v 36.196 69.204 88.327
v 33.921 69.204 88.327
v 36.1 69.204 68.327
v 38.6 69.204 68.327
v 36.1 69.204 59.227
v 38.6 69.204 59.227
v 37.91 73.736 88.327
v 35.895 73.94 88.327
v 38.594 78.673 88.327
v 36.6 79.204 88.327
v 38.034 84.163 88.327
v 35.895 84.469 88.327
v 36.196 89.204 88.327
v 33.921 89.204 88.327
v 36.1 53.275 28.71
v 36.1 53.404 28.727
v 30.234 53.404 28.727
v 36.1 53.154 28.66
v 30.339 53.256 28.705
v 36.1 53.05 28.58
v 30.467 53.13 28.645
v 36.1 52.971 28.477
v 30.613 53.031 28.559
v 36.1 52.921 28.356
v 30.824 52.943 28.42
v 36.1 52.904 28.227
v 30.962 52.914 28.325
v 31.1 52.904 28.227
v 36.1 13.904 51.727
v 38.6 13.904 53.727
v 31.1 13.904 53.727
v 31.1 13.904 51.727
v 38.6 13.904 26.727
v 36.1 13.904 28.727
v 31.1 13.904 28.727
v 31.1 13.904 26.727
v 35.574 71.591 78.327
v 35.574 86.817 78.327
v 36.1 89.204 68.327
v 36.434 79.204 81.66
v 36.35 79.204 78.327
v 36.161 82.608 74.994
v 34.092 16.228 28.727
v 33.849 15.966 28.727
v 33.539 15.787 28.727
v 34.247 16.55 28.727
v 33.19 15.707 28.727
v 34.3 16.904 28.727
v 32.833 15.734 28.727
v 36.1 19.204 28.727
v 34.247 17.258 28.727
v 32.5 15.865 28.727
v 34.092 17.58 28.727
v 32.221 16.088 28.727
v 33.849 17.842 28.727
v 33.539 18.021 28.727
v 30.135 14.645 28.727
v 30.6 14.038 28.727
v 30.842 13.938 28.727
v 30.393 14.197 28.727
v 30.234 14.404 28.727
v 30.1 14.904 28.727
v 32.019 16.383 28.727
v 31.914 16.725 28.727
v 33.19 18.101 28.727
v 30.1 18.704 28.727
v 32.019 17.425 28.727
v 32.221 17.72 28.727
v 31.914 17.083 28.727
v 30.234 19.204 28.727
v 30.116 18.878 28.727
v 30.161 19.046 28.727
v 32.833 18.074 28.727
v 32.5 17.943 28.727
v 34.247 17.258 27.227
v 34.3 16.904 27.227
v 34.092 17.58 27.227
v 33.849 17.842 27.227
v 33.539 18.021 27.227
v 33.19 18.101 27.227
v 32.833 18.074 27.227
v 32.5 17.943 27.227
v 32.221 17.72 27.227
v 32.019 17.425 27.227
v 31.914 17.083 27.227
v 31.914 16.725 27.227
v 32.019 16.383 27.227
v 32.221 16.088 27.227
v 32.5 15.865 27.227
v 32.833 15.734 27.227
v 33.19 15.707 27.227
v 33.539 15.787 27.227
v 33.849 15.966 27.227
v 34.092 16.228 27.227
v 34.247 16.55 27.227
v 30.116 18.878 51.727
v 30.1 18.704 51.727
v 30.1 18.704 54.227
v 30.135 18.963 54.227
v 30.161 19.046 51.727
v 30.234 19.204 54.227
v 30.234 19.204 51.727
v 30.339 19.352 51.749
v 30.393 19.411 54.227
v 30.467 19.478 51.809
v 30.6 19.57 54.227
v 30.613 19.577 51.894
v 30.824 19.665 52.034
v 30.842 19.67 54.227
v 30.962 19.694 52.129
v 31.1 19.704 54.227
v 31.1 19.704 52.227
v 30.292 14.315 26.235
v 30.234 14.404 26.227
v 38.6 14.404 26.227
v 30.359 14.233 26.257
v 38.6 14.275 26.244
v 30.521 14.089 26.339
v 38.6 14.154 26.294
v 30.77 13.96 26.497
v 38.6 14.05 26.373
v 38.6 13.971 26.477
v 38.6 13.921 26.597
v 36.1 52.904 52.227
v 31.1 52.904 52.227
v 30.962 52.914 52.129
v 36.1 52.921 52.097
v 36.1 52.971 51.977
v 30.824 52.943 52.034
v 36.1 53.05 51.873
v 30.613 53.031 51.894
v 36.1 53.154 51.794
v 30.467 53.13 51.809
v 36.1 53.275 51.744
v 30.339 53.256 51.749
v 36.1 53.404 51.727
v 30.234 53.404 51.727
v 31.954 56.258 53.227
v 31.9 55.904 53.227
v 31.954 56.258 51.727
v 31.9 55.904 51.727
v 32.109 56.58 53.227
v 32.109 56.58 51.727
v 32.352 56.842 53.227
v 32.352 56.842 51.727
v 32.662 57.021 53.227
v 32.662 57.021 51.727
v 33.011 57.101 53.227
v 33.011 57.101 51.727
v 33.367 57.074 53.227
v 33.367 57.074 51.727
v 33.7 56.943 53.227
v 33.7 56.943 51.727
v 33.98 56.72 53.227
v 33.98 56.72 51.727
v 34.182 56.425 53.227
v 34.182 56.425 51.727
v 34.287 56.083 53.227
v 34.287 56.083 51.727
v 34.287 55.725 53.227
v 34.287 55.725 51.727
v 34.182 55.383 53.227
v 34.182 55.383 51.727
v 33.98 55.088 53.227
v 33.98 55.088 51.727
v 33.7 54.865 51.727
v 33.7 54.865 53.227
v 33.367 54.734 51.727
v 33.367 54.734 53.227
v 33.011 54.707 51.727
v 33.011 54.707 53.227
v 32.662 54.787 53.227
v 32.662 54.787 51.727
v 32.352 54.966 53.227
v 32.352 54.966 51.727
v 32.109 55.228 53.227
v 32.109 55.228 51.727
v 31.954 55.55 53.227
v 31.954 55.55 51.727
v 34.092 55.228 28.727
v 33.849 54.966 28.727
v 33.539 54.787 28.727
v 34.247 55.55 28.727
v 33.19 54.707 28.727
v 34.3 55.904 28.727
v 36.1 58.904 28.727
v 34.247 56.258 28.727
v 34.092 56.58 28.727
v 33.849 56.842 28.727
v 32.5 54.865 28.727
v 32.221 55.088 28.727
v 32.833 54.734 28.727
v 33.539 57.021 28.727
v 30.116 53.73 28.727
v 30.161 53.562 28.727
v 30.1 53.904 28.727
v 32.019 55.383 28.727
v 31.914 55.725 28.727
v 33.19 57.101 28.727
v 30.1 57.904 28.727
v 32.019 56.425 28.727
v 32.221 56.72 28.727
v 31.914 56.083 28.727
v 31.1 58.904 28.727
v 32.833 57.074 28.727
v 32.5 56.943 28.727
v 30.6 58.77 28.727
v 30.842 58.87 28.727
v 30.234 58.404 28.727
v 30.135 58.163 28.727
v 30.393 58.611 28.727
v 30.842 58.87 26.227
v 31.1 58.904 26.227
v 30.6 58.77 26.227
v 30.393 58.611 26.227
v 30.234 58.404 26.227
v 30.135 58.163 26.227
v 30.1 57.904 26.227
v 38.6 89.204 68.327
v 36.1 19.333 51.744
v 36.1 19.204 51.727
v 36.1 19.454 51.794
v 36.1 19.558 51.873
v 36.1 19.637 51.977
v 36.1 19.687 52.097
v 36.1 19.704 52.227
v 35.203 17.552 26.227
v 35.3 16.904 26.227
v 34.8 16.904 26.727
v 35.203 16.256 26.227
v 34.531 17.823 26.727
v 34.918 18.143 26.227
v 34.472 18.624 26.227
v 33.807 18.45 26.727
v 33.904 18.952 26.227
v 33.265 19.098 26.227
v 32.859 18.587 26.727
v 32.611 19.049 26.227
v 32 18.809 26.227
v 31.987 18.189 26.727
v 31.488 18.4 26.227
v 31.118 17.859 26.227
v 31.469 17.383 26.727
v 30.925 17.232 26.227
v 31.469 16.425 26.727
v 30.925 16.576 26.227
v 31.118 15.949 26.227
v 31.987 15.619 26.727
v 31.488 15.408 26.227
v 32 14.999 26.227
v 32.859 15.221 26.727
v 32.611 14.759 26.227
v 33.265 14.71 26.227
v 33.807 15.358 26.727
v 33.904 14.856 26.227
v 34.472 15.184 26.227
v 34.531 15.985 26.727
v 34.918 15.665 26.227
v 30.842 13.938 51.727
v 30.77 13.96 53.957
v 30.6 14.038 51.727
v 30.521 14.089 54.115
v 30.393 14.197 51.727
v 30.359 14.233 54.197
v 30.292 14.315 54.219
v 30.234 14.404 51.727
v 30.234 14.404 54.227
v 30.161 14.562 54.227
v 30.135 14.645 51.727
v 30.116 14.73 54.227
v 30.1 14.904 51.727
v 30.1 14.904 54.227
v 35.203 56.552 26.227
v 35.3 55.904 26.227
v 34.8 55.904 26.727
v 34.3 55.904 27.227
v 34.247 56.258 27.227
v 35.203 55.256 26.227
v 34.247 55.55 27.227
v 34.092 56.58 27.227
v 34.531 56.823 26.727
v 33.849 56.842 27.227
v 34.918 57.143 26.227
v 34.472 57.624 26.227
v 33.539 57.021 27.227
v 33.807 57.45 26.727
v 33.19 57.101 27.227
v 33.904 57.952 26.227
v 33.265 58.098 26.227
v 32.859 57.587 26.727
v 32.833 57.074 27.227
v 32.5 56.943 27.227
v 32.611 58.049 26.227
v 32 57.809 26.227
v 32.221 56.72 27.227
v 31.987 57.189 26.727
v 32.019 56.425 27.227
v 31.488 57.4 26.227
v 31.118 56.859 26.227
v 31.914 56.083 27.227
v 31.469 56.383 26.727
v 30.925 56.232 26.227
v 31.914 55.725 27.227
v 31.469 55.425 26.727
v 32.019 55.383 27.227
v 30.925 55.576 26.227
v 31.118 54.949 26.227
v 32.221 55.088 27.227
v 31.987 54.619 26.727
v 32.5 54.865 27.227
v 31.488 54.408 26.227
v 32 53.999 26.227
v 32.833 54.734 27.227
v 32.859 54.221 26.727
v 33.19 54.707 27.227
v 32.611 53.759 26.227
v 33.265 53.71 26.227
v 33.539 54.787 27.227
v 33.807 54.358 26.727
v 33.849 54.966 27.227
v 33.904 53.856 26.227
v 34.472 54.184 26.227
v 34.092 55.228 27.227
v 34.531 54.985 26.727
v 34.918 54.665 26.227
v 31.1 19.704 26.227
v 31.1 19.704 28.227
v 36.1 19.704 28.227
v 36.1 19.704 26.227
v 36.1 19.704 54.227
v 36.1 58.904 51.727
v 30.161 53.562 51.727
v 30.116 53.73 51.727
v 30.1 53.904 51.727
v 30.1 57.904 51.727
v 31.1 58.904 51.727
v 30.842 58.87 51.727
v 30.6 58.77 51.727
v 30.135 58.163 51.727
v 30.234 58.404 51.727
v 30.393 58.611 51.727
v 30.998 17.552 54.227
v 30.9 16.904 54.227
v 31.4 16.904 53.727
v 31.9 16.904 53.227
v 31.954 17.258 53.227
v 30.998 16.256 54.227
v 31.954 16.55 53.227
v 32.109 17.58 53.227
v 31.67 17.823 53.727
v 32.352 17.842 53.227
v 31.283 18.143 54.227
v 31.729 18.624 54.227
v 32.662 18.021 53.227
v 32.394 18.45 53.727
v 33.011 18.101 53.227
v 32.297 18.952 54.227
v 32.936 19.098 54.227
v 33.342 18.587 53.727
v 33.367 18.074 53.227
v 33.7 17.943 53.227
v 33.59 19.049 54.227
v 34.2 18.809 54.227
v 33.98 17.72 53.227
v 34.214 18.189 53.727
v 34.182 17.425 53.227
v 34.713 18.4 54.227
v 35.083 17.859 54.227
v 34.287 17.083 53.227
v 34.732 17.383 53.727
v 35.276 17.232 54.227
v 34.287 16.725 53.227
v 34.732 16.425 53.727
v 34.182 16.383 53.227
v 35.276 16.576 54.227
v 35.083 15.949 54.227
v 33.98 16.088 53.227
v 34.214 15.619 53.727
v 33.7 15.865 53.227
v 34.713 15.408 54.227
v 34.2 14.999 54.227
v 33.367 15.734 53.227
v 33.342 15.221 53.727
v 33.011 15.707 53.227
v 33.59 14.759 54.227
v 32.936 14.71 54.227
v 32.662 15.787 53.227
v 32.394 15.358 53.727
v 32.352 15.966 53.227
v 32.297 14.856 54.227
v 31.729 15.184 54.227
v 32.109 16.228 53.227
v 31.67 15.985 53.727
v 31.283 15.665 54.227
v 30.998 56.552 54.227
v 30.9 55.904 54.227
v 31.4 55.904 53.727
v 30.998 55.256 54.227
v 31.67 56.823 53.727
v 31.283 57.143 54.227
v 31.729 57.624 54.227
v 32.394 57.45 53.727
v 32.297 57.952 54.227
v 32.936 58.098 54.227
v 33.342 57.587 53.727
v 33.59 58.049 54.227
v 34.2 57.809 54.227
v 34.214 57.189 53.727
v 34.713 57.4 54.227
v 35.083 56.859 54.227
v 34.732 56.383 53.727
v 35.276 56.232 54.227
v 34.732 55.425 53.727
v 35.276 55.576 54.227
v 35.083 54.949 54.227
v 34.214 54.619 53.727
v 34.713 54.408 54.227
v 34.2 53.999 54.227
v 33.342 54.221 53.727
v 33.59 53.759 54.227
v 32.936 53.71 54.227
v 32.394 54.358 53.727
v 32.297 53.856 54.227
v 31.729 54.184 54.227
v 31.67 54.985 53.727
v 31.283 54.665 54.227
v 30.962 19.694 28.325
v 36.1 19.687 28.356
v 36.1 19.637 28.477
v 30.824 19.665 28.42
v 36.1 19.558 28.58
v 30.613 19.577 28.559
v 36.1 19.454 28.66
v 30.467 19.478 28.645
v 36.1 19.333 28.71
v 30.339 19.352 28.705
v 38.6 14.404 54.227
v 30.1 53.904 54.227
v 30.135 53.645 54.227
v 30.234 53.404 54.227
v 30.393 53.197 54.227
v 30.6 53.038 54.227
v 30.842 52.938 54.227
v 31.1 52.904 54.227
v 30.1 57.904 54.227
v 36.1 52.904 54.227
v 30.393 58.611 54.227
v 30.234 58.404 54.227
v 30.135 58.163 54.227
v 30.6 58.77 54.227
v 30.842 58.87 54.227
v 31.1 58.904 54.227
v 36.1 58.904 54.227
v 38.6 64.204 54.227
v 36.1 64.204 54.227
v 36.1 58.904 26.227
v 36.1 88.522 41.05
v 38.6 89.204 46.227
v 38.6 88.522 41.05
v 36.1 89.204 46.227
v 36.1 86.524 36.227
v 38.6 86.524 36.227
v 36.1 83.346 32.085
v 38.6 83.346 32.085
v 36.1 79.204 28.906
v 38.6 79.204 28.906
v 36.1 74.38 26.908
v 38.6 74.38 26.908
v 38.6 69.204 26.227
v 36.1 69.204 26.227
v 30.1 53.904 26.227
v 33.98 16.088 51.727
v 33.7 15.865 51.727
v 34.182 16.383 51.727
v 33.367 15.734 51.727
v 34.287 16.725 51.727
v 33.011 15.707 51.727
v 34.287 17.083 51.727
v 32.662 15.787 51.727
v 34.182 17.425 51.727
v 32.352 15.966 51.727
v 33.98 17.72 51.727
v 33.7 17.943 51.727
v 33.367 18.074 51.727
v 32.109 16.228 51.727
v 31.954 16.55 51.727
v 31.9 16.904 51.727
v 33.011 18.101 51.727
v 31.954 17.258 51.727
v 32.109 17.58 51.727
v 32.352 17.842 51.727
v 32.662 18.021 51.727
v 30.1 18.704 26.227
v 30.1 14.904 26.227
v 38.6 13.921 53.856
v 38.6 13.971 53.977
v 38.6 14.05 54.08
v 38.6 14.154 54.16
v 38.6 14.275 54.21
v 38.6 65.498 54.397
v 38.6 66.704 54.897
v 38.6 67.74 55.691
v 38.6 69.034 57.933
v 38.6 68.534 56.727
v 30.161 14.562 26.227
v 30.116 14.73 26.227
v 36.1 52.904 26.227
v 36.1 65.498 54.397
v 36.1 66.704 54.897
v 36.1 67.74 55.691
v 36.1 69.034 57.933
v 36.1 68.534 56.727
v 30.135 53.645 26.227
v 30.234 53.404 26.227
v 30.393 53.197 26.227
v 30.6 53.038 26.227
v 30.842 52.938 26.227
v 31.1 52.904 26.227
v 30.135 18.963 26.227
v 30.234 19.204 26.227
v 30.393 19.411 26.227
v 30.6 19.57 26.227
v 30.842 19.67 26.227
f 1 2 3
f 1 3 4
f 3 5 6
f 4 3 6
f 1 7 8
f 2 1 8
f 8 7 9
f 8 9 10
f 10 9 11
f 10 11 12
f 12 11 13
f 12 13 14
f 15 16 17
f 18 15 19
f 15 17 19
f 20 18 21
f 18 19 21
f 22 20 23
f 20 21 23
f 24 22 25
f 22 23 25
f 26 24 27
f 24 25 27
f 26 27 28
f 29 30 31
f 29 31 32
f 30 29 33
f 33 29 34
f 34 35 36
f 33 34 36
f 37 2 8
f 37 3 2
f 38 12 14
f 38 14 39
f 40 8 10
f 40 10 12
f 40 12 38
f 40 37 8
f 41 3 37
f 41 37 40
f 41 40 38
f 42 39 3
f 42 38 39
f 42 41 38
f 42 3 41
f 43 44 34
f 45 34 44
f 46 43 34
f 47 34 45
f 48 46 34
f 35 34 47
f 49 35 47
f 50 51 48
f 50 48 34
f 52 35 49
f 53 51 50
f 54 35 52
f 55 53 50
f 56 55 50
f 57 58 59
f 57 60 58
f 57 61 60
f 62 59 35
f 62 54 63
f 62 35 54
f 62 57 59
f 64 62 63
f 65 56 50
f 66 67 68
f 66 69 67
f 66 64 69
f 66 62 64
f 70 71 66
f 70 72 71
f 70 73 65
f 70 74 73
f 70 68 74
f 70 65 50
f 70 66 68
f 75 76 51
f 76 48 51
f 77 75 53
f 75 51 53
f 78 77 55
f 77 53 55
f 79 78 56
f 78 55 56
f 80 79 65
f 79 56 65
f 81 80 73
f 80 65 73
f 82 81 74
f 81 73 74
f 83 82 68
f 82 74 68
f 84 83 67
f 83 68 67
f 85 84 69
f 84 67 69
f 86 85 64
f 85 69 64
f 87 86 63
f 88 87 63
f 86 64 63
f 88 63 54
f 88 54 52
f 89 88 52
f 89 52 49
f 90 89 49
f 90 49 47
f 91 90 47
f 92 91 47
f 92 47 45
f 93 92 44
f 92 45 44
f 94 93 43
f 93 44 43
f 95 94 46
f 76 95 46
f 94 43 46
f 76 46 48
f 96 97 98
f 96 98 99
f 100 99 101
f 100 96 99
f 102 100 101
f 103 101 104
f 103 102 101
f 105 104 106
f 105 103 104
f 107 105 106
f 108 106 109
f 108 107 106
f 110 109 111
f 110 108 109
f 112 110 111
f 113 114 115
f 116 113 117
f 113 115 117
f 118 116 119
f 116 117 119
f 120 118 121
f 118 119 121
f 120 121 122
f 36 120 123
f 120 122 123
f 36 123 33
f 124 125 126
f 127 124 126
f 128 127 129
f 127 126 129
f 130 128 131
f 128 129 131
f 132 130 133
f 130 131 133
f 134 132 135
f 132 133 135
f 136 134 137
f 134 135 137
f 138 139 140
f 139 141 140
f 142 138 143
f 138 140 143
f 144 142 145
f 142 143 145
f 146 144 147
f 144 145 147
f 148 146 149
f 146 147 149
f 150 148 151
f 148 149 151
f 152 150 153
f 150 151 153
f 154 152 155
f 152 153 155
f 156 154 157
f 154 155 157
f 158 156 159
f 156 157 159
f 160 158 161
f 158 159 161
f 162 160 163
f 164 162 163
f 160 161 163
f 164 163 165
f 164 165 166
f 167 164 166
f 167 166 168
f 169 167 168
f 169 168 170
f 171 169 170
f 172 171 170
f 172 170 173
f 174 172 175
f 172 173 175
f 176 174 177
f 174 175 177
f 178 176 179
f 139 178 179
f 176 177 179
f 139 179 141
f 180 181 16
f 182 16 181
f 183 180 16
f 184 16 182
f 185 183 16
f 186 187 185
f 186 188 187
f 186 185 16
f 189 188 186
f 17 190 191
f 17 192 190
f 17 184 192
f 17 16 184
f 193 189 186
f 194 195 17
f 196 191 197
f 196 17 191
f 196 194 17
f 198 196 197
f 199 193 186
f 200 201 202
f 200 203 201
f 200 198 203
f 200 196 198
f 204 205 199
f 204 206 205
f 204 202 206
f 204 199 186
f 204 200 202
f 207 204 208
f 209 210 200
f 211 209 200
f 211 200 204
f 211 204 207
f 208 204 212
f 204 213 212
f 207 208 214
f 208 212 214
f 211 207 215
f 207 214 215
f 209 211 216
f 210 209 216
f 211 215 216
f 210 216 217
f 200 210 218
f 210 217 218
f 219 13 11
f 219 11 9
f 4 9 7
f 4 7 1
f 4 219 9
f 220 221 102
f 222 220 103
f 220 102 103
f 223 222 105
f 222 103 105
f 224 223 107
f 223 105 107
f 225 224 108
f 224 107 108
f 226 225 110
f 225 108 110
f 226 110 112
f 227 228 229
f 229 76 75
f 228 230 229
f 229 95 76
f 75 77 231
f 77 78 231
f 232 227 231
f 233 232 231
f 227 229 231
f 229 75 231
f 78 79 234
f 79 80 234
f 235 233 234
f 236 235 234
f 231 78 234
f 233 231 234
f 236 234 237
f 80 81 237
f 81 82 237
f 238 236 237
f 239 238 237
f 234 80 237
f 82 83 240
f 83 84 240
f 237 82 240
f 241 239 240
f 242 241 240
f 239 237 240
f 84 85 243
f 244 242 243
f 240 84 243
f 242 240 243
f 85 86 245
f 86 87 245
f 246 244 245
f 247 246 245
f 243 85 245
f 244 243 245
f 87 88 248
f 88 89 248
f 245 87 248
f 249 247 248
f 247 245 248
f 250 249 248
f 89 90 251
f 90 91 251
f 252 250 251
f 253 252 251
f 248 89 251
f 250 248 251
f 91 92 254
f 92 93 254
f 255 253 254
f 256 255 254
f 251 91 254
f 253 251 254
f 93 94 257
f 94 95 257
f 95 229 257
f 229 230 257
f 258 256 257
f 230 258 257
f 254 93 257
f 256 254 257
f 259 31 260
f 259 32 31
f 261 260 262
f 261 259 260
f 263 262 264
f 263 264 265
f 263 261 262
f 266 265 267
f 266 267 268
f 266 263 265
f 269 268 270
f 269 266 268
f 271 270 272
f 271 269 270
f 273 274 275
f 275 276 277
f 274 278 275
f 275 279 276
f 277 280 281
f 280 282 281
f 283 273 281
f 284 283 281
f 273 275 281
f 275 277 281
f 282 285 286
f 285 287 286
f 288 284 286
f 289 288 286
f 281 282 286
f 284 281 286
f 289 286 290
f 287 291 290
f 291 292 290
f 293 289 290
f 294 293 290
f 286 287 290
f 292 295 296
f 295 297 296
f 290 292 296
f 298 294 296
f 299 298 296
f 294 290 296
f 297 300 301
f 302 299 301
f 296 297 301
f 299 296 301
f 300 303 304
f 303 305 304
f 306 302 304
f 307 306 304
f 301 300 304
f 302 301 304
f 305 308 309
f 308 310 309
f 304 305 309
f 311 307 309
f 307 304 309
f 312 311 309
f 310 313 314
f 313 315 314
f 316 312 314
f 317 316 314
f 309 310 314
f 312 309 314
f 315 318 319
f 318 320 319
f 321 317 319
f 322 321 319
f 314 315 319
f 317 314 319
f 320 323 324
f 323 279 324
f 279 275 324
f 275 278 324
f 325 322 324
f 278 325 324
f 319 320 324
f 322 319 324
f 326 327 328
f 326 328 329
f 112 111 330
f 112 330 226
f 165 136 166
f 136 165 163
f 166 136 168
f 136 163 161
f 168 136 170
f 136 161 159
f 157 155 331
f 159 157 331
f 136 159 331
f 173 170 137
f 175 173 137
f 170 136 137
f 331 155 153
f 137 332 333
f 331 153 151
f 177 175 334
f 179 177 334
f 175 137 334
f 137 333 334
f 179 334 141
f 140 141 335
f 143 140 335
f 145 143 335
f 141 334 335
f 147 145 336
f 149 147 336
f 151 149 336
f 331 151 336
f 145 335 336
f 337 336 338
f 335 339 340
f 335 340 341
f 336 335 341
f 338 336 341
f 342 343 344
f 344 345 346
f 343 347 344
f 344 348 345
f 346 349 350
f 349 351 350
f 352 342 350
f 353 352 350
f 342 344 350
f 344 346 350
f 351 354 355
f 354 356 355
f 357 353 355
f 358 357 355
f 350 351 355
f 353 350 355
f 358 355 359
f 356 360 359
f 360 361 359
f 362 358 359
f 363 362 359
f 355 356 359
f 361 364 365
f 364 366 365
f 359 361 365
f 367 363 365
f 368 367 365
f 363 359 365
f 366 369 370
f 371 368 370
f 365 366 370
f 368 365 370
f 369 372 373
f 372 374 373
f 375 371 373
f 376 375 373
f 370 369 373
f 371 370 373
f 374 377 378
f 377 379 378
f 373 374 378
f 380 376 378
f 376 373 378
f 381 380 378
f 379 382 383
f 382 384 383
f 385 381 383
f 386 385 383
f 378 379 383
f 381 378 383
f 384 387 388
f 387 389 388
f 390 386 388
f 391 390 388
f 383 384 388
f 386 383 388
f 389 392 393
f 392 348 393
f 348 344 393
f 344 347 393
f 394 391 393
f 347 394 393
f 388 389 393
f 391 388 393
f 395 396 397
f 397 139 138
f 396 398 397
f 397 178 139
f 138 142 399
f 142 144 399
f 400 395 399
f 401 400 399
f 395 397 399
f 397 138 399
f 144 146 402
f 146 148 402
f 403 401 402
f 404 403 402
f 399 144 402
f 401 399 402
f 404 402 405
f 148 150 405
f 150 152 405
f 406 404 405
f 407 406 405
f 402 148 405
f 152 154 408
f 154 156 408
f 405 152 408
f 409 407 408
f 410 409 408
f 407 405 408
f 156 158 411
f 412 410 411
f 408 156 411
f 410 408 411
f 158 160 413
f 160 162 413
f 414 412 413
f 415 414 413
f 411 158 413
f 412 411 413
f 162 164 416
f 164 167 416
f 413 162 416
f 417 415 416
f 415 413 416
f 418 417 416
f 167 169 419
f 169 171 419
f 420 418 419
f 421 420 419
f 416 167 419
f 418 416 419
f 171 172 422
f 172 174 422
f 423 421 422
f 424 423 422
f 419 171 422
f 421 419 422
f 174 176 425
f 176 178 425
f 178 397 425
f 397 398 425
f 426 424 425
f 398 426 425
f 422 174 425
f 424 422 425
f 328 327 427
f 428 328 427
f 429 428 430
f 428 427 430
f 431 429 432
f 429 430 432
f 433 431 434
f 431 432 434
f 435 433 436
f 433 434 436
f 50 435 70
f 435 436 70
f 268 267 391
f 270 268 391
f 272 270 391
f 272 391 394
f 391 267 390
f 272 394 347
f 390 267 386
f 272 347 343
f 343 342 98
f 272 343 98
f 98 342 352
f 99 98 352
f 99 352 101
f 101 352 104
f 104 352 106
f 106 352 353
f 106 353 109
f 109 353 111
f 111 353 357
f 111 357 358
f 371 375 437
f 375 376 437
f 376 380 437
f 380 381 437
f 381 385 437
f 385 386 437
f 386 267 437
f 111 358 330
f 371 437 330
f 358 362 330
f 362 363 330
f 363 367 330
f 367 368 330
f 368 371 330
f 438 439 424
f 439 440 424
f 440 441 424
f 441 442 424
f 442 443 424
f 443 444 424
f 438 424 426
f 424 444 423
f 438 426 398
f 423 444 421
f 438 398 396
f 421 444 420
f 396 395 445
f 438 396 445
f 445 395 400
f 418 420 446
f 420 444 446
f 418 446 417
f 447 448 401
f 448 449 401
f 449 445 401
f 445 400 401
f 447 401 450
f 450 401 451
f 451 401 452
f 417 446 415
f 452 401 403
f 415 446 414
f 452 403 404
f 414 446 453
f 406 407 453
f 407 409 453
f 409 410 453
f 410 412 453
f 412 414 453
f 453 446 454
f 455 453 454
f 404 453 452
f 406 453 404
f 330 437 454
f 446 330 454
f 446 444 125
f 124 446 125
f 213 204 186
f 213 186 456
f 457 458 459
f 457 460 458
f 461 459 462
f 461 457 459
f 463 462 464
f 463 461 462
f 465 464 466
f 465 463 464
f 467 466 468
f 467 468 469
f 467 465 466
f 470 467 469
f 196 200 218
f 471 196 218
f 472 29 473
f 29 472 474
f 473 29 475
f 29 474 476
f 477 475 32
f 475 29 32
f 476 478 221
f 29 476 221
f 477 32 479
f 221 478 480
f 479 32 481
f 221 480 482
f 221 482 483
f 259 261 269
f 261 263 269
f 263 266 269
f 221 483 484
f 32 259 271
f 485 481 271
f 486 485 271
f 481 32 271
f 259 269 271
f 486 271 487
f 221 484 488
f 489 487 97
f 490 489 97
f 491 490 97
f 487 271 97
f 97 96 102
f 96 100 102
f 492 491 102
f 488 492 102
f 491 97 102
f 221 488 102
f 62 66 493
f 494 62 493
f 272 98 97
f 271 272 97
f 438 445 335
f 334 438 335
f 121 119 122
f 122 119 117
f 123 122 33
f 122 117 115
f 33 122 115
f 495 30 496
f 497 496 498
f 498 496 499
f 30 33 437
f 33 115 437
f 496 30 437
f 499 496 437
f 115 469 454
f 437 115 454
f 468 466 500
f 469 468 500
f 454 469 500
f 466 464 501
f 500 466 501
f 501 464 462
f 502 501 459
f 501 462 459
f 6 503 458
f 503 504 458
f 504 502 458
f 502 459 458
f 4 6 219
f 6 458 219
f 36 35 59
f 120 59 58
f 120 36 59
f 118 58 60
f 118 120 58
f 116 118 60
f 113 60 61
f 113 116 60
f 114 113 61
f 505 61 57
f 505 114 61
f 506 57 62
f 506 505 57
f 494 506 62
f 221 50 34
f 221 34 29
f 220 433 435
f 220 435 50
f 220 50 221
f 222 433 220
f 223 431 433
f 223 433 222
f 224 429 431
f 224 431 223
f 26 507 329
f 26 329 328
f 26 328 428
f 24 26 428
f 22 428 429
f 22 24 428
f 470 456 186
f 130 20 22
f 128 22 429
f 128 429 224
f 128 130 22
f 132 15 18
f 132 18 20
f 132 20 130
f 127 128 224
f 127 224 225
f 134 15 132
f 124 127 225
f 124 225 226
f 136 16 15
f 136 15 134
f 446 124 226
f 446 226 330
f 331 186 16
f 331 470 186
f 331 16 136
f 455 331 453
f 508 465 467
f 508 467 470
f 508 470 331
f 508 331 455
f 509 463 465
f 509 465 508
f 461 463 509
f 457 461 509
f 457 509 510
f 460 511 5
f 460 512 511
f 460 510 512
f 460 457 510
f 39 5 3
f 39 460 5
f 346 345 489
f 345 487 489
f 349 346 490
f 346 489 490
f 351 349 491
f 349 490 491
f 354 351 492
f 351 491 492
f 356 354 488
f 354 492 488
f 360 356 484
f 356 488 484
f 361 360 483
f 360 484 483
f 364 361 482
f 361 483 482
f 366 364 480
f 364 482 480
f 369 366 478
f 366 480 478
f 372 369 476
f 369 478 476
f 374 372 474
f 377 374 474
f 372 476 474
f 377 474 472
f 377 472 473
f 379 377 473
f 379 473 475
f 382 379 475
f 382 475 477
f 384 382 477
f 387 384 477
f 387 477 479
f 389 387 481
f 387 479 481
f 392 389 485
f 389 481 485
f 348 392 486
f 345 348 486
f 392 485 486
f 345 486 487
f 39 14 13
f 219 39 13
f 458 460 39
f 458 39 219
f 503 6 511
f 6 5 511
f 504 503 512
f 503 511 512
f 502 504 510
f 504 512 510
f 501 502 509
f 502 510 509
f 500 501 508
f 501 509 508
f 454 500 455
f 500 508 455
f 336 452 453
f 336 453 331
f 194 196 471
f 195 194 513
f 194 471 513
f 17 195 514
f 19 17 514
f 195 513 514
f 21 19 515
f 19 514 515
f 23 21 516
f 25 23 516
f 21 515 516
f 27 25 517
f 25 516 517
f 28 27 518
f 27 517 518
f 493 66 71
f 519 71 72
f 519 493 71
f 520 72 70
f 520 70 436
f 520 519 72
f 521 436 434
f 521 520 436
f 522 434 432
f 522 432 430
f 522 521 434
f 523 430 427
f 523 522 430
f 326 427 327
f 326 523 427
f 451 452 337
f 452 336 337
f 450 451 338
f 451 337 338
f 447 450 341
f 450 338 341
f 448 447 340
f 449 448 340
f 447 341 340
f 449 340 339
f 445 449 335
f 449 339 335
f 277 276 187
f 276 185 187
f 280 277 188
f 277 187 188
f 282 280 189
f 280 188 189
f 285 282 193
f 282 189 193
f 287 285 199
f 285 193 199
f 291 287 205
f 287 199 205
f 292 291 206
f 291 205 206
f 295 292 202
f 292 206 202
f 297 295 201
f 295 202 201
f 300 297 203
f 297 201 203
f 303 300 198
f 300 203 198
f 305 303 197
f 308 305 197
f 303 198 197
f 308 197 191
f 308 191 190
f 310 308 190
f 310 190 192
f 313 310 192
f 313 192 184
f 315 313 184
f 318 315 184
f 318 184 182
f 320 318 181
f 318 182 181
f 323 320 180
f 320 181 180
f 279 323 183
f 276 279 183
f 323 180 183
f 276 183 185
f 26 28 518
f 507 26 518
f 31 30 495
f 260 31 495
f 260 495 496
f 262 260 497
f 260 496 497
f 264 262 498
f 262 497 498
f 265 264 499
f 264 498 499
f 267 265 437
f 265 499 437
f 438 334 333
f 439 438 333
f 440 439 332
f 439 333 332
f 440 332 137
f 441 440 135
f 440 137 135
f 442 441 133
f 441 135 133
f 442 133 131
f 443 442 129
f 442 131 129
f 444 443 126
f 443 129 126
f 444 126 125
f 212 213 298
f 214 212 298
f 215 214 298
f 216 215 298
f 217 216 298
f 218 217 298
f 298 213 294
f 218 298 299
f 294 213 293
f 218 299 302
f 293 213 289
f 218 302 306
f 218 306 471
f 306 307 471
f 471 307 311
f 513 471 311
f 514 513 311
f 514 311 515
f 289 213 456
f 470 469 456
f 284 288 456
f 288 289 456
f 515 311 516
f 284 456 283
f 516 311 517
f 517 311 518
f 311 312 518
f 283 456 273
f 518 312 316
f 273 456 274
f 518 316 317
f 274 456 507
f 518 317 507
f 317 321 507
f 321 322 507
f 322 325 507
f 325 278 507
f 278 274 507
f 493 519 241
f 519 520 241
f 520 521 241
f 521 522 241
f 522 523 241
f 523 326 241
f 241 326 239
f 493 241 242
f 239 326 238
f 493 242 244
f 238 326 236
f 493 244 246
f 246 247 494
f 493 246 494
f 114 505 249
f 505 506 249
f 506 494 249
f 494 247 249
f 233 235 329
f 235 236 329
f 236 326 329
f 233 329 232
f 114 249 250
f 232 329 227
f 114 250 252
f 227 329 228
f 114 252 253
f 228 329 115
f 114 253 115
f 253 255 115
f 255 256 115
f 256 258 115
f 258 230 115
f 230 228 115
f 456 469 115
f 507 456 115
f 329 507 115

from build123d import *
from OCP.BRepFilletAPI import BRepFilletAPI_MakeFillet

# Parameters (mm, degrees)
SKETCH1_W                                           = 2.5
SKETCH1_H                                           = 6
BOSS_EXTRUDE1_DEPTH                                 = 6
SKETCH1_H_2                                         = 5.8
BOSS_EXTRUDE1_2_DEPTH                               = 6
BOSS_EXTRUDE1_3_DEPTH                               = 6
BOSS_EXTRUDE1_4_DEPTH                               = 6
SKETCH2_W                                           = 28
SKETCH2_H                                           = 45
BOSS_EXTRUDE2_DEPTH                                 = 2.5
BOSS_EXTRUDE3_DEPTH                                 = 2.5
CSK_FOR_M2_COUNTERSUNK_FLAT_HEAD_SCREW1_D           = 2.4
CSK_FOR_M2_COUNTERSUNK_FLAT_HEAD_SCREW1_DEPTH       = 4
CSK_FOR_M2_COUNTERSUNK_FLAT_HEAD_SCREW1_CSINK_D     = 4.4
CSK_FOR_M2_COUNTERSUNK_FLAT_HEAD_SCREW1_CSINK_ANGLE = 90
CSK_FOR_M2_COUNTERSUNK_FLAT_HEAD_SCREW1_TIP         = 0.721032743
CSK_FOR_M2_COUNTERSUNK_FLAT_HEAD_SCREW2_D           = 2.4
CSK_FOR_M2_COUNTERSUNK_FLAT_HEAD_SCREW2_DEPTH       = 4
CSK_FOR_M2_COUNTERSUNK_FLAT_HEAD_SCREW2_CSINK_D     = 4.4
CSK_FOR_M2_COUNTERSUNK_FLAT_HEAD_SCREW2_CSINK_ANGLE = 90
CSK_FOR_M2_COUNTERSUNK_FLAT_HEAD_SCREW2_TIP         = 0.721032743
FILLET1_R1                                          = 20
FILLET1_R2                                          = 5
FILLET2_R                                           = 1
FILLET3_R                                           = 0.5


with BuildPart() as part:
    # Sketch1 → Boss-Extrude1 (new body)
    with BuildSketch(Plane(origin=(30.100472417, 0, 0), x_dir=(0, 0, -1), z_dir=(1, 0, 0))):
        with Locations((-27.476835801, 55.903969126)):
            Rectangle(SKETCH1_W, SKETCH1_H)
    extrude(amount=BOSS_EXTRUDE1_DEPTH)



with BuildPart() as body_2:
    # Sketch1 → Boss-Extrude1 2 (new body)
    with BuildSketch(Plane(origin=(30.100472417, 0, 0), x_dir=(0, 0, -1), z_dir=(1, 0, 0))):
        with Locations((-27.476835801, 16.803969126)):
            Rectangle(SKETCH1_W, SKETCH1_H_2)
    extrude(amount=BOSS_EXTRUDE1_2_DEPTH)


with BuildPart() as body_3:
    # Sketch1 → Boss-Extrude1 3 (new body)
    with BuildSketch(Plane(origin=(30.100472417, 0, 0), x_dir=(0, 0, -1), z_dir=(1, 0, 0))):
        with Locations((-52.976835801, 16.803969126)):
            Rectangle(SKETCH1_W, SKETCH1_H_2)
    extrude(amount=BOSS_EXTRUDE1_3_DEPTH)


with BuildPart() as body_4:
    # Sketch1 → Boss-Extrude1 4 (new body)
    with BuildSketch(Plane(origin=(30.100472417, 0, 0), x_dir=(0, 0, -1), z_dir=(1, 0, 0))):
        with Locations((-52.976835801, 55.903969126)):
            Rectangle(SKETCH1_W, SKETCH1_H)
    extrude(amount=BOSS_EXTRUDE1_4_DEPTH)


with BuildPart() as part_1:
    add(part.part)

    add(body_2.part)  # Boss-Extrude2 merges body 2

    add(body_3.part)  # Boss-Extrude2 merges body 3

    add(body_4.part)  # Boss-Extrude2 merges body 4
    # Sketch2 → Boss-Extrude2 (add)
    with BuildSketch(Plane(origin=(36.100472417, 0, 0), x_dir=(0, 0, -1), z_dir=(1, 0, 0))):
        with Locations((-40.226835801, 36.403969126)):
            Rectangle(SKETCH2_W, SKETCH2_H)
    extrude(amount=BOSS_EXTRUDE2_DEPTH)

    # Sketch3 → Boss-Extrude3 (add)
    with BuildSketch(Plane(origin=(38.600472417, 0, 0), x_dir=(0, 0, -1), z_dir=(1, 0, 0))):
        Polygon((-68.326835801, 89.203969126), (-26.226835801, 89.203969126), (-26.226835801, 58.903969126), (-54.226835801, 58.903969126), (-54.226835801, 69.203969126), (-68.326835801, 69.203969126), align=None)
    extrude(amount=-BOSS_EXTRUDE3_DEPTH)

    # CSK for M2 Countersunk Flat Head Screw1
    with Locations(Plane.XY.offset(54.226835801)):
        with Locations((33.100472417, 55.903969126), (33.100472417, 16.903969126)):
            CounterSinkHole(CSK_FOR_M2_COUNTERSUNK_FLAT_HEAD_SCREW1_D / 2, CSK_FOR_M2_COUNTERSUNK_FLAT_HEAD_SCREW1_CSINK_D / 2, depth=CSK_FOR_M2_COUNTERSUNK_FLAT_HEAD_SCREW1_DEPTH, counter_sink_angle=CSK_FOR_M2_COUNTERSUNK_FLAT_HEAD_SCREW1_CSINK_ANGLE)
            with Locations((0, 0, -(CSK_FOR_M2_COUNTERSUNK_FLAT_HEAD_SCREW1_DEPTH + CSK_FOR_M2_COUNTERSUNK_FLAT_HEAD_SCREW1_TIP / 2))):  # 118° drill point
                Cone(0, CSK_FOR_M2_COUNTERSUNK_FLAT_HEAD_SCREW1_D / 2, CSK_FOR_M2_COUNTERSUNK_FLAT_HEAD_SCREW1_TIP, mode=Mode.SUBTRACT)

    # CSK for M2 Countersunk Flat Head Screw2
    with Locations(Plane(origin=(0, 0, 26.226835801), x_dir=(-1, 0, 0), z_dir=(0, 0, -1))):
        with Locations((-33.100472417, 55.903969126), (-33.100472417, 16.903969126)):
            CounterSinkHole(CSK_FOR_M2_COUNTERSUNK_FLAT_HEAD_SCREW2_D / 2, CSK_FOR_M2_COUNTERSUNK_FLAT_HEAD_SCREW2_CSINK_D / 2, depth=CSK_FOR_M2_COUNTERSUNK_FLAT_HEAD_SCREW2_DEPTH, counter_sink_angle=CSK_FOR_M2_COUNTERSUNK_FLAT_HEAD_SCREW2_CSINK_ANGLE)
            with Locations((0, 0, -(CSK_FOR_M2_COUNTERSUNK_FLAT_HEAD_SCREW2_DEPTH + CSK_FOR_M2_COUNTERSUNK_FLAT_HEAD_SCREW2_TIP / 2))):  # 118° drill point
                Cone(0, CSK_FOR_M2_COUNTERSUNK_FLAT_HEAD_SCREW2_D / 2, CSK_FOR_M2_COUNTERSUNK_FLAT_HEAD_SCREW2_TIP, mode=Mode.SUBTRACT)

    # Fillet1: one fillet with a radius per group of edges: ONE call of the kernel's fillet builder (fillet() takes one radius for all edges)
    fillet1_edges_1 = [part_1.edges().sort_by_distance(p)[0] for p in [
        (37.350472417, 89.203969126, 26.226835801),
    ]]
    fillet1_edges_2 = [part_1.edges().sort_by_distance(p)[0] for p in [
        (37.350472417, 69.203969126, 54.226835801),
    ]]
    fillet1 = BRepFilletAPI_MakeFillet(part_1.part.solid().wrapped)
    for e in fillet1_edges_1:
        fillet1.Add(FILLET1_R1, e.wrapped)
    for e in fillet1_edges_2:
        fillet1.Add(FILLET1_R2, e.wrapped)
    add(Compound.cast(fillet1.Shape()), mode=Mode.REPLACE)

    # Loft1: read off the stored shape, not the designer's step
    # Loft1: loft between two sections, ruled curve by curve
    loft1_from = [
        Edge.make_bspline([(36.19639036, 89.203969126, 88.326835801), (36.953966117, 87.719429888, 88.326835801), (37.561920044, 86.105994191, 88.326835801), (38.385620937, 82.729240829, 88.326835801), (38.600472417, 80.966962635, 88.326835801), (38.600472417, 77.440975617, 88.326835801), (38.385620937, 75.678697423, 88.326835801), (37.561920044, 72.30194406, 88.326835801), (36.953966117, 70.688508364, 88.326835801), (36.19639036, 69.203969126, 88.326835801)], [0, 0, 0, 0, 0.25, 0.25, 0.5, 0.5, 0.75, 0.75, 1, 1, 1, 1], 3),
        Edge.make_bspline([(33.920980493, 69.203969126, 88.326835801), (34.754313826, 70.647344799, 88.326835801), (35.433250093, 72.246533252, 88.326835801), (36.357078765, 75.632424009, 88.326835801), (36.600472417, 77.417641176, 88.326835801), (36.600472417, 80.990297075, 88.326835801), (36.357078765, 82.775514243, 88.326835801), (35.433250093, 86.161405, 88.326835801), (34.754313826, 87.760593453, 88.326835801), (33.920980493, 89.203969126, 88.326835801)], [0, 0, 0, 0, 0.25, 0.25, 0.5, 0.5, 0.75, 0.75, 1, 1, 1, 1], 3),
        Edge.make_line((33.920980493, 69.203969126, 88.326835801), (36.19639036, 69.203969126, 88.326835801)),
        Edge.make_line((33.920980493, 89.203969126, 88.326835801), (36.19639036, 89.203969126, 88.326835801)),
    ]
    loft1_to = [
        Edge.make_bspline([(38.600472417, 89.203969126, 68.326835801), (38.600472417, 87.537302459, 68.326835801), (38.600472417, 85.870635792, 68.326835801), (38.600472417, 82.537302459, 68.326835801), (38.600472417, 80.870635792, 68.326835801), (38.600472417, 77.537302459, 68.326835801), (38.600472417, 75.870635792, 68.326835801), (38.600472417, 72.537302459, 68.326835801), (38.600472417, 70.870635792, 68.326835801), (38.600472417, 69.203969126, 68.326835801)], [0, 0, 0, 0, 0.25, 0.25, 0.5, 0.5, 0.75, 0.75, 1, 1, 1, 1], 3),
        Edge.make_bspline([(36.100472417, 69.203969126, 68.326835801), (36.100472417, 70.870635792, 68.326835801), (36.100472417, 72.537302459, 68.326835801), (36.100472417, 75.870635792, 68.326835801), (36.100472417, 77.537302459, 68.326835801), (36.100472417, 80.870635792, 68.326835801), (36.100472417, 82.537302459, 68.326835801), (36.100472417, 85.870635792, 68.326835801), (36.100472417, 87.537302459, 68.326835801), (36.100472417, 89.203969126, 68.326835801)], [0, 0, 0, 0, 0.25, 0.25, 0.5, 0.5, 0.75, 0.75, 1, 1, 1, 1], 3),
        Edge.make_line((36.100472417, 69.203969126, 68.326835801), (38.600472417, 69.203969126, 68.326835801)),
        Edge.make_line((36.100472417, 89.203969126, 68.326835801), (38.600472417, 89.203969126, 68.326835801)),
    ]
    loft1 = Solid(Shell([*[Face.make_surface_from_curves(loft1_from[k], loft1_to[k]) for k in range(4)], Face(Wire(loft1_from)), Face(Wire(loft1_to))]))
    add(loft1)

    # Fillet2
    fillet2_edges = [part_1.edges().sort_by_distance(p)[0] for p in [
        (30.100472417, 58.903969126, 27.476835801),
        (30.100472417, 52.903969126, 27.476835801),
        (30.100472417, 19.703969126, 27.476835801),
        (30.100472417, 13.903969126, 27.476835801),
        (30.100472417, 13.903969126, 52.976835801),
        (30.100472417, 19.703969126, 52.976835801),
        (30.100472417, 52.903969126, 52.976835801),
        (30.100472417, 58.903969126, 52.976835801),
    ]]
    fillet(fillet2_edges, radius=FILLET2_R)

    # Fillet3
    # the kernel refuses this fillet: 0.5 mm, written as the material it takes off along each edge
    with BuildSketch(Plane(origin=(29.850472417, 52.903969126, 28.726835801), x_dir=(0, 1, 0), z_dir=(1, 0, 0)), Plane(origin=(29.850472417, 52.903969126, 51.726835801), x_dir=(0, 0, 1), z_dir=(1, 0, 0))) as fillet3_piece_1:
        with BuildLine():
            CenterArc((FILLET3_R, -FILLET3_R), FILLET3_R, 90, 90)
            Line((0, -FILLET3_R), (0, 0))
            Line((0, 0), (FILLET3_R, 0))
        make_face()
    extrude(amount=6.25, mode=Mode.SUBTRACT)
    with BuildSketch(Plane(origin=(39.850472417, 13.903969126, 26.226835801), x_dir=(0, 0, 1), z_dir=(-1, 0, 0)), Plane(origin=(39.850472417, 13.903969126, 54.226835801), x_dir=(0, 1, 0), z_dir=(-1, 0, 0))) as fillet3_piece_2:
        with BuildLine():
            CenterArc((FILLET3_R, FILLET3_R), FILLET3_R, 180, 90)
            Line((0, FILLET3_R), (0, 0))
            Line((0, 0), (FILLET3_R, 0))
        make_face()
    extrude(amount=10, mode=Mode.SUBTRACT)
    with BuildSketch(Plane(origin=(29.850472417, 19.703969126, 28.726835801), x_dir=(0, -1, 0), z_dir=(1, 0, 0)), Plane(origin=(29.850472417, 19.703969126, 51.726835801), x_dir=(0, 0, 1), z_dir=(1, 0, 0))) as fillet3_piece_3:
        with BuildLine():
            CenterArc((FILLET3_R, FILLET3_R), FILLET3_R, 180, 90)
            Line((0, FILLET3_R), (0, 0))
            Line((0, 0), (FILLET3_R, 0))
        make_face()
    extrude(amount=6.25, mode=Mode.SUBTRACT)


solid = part_1.part
